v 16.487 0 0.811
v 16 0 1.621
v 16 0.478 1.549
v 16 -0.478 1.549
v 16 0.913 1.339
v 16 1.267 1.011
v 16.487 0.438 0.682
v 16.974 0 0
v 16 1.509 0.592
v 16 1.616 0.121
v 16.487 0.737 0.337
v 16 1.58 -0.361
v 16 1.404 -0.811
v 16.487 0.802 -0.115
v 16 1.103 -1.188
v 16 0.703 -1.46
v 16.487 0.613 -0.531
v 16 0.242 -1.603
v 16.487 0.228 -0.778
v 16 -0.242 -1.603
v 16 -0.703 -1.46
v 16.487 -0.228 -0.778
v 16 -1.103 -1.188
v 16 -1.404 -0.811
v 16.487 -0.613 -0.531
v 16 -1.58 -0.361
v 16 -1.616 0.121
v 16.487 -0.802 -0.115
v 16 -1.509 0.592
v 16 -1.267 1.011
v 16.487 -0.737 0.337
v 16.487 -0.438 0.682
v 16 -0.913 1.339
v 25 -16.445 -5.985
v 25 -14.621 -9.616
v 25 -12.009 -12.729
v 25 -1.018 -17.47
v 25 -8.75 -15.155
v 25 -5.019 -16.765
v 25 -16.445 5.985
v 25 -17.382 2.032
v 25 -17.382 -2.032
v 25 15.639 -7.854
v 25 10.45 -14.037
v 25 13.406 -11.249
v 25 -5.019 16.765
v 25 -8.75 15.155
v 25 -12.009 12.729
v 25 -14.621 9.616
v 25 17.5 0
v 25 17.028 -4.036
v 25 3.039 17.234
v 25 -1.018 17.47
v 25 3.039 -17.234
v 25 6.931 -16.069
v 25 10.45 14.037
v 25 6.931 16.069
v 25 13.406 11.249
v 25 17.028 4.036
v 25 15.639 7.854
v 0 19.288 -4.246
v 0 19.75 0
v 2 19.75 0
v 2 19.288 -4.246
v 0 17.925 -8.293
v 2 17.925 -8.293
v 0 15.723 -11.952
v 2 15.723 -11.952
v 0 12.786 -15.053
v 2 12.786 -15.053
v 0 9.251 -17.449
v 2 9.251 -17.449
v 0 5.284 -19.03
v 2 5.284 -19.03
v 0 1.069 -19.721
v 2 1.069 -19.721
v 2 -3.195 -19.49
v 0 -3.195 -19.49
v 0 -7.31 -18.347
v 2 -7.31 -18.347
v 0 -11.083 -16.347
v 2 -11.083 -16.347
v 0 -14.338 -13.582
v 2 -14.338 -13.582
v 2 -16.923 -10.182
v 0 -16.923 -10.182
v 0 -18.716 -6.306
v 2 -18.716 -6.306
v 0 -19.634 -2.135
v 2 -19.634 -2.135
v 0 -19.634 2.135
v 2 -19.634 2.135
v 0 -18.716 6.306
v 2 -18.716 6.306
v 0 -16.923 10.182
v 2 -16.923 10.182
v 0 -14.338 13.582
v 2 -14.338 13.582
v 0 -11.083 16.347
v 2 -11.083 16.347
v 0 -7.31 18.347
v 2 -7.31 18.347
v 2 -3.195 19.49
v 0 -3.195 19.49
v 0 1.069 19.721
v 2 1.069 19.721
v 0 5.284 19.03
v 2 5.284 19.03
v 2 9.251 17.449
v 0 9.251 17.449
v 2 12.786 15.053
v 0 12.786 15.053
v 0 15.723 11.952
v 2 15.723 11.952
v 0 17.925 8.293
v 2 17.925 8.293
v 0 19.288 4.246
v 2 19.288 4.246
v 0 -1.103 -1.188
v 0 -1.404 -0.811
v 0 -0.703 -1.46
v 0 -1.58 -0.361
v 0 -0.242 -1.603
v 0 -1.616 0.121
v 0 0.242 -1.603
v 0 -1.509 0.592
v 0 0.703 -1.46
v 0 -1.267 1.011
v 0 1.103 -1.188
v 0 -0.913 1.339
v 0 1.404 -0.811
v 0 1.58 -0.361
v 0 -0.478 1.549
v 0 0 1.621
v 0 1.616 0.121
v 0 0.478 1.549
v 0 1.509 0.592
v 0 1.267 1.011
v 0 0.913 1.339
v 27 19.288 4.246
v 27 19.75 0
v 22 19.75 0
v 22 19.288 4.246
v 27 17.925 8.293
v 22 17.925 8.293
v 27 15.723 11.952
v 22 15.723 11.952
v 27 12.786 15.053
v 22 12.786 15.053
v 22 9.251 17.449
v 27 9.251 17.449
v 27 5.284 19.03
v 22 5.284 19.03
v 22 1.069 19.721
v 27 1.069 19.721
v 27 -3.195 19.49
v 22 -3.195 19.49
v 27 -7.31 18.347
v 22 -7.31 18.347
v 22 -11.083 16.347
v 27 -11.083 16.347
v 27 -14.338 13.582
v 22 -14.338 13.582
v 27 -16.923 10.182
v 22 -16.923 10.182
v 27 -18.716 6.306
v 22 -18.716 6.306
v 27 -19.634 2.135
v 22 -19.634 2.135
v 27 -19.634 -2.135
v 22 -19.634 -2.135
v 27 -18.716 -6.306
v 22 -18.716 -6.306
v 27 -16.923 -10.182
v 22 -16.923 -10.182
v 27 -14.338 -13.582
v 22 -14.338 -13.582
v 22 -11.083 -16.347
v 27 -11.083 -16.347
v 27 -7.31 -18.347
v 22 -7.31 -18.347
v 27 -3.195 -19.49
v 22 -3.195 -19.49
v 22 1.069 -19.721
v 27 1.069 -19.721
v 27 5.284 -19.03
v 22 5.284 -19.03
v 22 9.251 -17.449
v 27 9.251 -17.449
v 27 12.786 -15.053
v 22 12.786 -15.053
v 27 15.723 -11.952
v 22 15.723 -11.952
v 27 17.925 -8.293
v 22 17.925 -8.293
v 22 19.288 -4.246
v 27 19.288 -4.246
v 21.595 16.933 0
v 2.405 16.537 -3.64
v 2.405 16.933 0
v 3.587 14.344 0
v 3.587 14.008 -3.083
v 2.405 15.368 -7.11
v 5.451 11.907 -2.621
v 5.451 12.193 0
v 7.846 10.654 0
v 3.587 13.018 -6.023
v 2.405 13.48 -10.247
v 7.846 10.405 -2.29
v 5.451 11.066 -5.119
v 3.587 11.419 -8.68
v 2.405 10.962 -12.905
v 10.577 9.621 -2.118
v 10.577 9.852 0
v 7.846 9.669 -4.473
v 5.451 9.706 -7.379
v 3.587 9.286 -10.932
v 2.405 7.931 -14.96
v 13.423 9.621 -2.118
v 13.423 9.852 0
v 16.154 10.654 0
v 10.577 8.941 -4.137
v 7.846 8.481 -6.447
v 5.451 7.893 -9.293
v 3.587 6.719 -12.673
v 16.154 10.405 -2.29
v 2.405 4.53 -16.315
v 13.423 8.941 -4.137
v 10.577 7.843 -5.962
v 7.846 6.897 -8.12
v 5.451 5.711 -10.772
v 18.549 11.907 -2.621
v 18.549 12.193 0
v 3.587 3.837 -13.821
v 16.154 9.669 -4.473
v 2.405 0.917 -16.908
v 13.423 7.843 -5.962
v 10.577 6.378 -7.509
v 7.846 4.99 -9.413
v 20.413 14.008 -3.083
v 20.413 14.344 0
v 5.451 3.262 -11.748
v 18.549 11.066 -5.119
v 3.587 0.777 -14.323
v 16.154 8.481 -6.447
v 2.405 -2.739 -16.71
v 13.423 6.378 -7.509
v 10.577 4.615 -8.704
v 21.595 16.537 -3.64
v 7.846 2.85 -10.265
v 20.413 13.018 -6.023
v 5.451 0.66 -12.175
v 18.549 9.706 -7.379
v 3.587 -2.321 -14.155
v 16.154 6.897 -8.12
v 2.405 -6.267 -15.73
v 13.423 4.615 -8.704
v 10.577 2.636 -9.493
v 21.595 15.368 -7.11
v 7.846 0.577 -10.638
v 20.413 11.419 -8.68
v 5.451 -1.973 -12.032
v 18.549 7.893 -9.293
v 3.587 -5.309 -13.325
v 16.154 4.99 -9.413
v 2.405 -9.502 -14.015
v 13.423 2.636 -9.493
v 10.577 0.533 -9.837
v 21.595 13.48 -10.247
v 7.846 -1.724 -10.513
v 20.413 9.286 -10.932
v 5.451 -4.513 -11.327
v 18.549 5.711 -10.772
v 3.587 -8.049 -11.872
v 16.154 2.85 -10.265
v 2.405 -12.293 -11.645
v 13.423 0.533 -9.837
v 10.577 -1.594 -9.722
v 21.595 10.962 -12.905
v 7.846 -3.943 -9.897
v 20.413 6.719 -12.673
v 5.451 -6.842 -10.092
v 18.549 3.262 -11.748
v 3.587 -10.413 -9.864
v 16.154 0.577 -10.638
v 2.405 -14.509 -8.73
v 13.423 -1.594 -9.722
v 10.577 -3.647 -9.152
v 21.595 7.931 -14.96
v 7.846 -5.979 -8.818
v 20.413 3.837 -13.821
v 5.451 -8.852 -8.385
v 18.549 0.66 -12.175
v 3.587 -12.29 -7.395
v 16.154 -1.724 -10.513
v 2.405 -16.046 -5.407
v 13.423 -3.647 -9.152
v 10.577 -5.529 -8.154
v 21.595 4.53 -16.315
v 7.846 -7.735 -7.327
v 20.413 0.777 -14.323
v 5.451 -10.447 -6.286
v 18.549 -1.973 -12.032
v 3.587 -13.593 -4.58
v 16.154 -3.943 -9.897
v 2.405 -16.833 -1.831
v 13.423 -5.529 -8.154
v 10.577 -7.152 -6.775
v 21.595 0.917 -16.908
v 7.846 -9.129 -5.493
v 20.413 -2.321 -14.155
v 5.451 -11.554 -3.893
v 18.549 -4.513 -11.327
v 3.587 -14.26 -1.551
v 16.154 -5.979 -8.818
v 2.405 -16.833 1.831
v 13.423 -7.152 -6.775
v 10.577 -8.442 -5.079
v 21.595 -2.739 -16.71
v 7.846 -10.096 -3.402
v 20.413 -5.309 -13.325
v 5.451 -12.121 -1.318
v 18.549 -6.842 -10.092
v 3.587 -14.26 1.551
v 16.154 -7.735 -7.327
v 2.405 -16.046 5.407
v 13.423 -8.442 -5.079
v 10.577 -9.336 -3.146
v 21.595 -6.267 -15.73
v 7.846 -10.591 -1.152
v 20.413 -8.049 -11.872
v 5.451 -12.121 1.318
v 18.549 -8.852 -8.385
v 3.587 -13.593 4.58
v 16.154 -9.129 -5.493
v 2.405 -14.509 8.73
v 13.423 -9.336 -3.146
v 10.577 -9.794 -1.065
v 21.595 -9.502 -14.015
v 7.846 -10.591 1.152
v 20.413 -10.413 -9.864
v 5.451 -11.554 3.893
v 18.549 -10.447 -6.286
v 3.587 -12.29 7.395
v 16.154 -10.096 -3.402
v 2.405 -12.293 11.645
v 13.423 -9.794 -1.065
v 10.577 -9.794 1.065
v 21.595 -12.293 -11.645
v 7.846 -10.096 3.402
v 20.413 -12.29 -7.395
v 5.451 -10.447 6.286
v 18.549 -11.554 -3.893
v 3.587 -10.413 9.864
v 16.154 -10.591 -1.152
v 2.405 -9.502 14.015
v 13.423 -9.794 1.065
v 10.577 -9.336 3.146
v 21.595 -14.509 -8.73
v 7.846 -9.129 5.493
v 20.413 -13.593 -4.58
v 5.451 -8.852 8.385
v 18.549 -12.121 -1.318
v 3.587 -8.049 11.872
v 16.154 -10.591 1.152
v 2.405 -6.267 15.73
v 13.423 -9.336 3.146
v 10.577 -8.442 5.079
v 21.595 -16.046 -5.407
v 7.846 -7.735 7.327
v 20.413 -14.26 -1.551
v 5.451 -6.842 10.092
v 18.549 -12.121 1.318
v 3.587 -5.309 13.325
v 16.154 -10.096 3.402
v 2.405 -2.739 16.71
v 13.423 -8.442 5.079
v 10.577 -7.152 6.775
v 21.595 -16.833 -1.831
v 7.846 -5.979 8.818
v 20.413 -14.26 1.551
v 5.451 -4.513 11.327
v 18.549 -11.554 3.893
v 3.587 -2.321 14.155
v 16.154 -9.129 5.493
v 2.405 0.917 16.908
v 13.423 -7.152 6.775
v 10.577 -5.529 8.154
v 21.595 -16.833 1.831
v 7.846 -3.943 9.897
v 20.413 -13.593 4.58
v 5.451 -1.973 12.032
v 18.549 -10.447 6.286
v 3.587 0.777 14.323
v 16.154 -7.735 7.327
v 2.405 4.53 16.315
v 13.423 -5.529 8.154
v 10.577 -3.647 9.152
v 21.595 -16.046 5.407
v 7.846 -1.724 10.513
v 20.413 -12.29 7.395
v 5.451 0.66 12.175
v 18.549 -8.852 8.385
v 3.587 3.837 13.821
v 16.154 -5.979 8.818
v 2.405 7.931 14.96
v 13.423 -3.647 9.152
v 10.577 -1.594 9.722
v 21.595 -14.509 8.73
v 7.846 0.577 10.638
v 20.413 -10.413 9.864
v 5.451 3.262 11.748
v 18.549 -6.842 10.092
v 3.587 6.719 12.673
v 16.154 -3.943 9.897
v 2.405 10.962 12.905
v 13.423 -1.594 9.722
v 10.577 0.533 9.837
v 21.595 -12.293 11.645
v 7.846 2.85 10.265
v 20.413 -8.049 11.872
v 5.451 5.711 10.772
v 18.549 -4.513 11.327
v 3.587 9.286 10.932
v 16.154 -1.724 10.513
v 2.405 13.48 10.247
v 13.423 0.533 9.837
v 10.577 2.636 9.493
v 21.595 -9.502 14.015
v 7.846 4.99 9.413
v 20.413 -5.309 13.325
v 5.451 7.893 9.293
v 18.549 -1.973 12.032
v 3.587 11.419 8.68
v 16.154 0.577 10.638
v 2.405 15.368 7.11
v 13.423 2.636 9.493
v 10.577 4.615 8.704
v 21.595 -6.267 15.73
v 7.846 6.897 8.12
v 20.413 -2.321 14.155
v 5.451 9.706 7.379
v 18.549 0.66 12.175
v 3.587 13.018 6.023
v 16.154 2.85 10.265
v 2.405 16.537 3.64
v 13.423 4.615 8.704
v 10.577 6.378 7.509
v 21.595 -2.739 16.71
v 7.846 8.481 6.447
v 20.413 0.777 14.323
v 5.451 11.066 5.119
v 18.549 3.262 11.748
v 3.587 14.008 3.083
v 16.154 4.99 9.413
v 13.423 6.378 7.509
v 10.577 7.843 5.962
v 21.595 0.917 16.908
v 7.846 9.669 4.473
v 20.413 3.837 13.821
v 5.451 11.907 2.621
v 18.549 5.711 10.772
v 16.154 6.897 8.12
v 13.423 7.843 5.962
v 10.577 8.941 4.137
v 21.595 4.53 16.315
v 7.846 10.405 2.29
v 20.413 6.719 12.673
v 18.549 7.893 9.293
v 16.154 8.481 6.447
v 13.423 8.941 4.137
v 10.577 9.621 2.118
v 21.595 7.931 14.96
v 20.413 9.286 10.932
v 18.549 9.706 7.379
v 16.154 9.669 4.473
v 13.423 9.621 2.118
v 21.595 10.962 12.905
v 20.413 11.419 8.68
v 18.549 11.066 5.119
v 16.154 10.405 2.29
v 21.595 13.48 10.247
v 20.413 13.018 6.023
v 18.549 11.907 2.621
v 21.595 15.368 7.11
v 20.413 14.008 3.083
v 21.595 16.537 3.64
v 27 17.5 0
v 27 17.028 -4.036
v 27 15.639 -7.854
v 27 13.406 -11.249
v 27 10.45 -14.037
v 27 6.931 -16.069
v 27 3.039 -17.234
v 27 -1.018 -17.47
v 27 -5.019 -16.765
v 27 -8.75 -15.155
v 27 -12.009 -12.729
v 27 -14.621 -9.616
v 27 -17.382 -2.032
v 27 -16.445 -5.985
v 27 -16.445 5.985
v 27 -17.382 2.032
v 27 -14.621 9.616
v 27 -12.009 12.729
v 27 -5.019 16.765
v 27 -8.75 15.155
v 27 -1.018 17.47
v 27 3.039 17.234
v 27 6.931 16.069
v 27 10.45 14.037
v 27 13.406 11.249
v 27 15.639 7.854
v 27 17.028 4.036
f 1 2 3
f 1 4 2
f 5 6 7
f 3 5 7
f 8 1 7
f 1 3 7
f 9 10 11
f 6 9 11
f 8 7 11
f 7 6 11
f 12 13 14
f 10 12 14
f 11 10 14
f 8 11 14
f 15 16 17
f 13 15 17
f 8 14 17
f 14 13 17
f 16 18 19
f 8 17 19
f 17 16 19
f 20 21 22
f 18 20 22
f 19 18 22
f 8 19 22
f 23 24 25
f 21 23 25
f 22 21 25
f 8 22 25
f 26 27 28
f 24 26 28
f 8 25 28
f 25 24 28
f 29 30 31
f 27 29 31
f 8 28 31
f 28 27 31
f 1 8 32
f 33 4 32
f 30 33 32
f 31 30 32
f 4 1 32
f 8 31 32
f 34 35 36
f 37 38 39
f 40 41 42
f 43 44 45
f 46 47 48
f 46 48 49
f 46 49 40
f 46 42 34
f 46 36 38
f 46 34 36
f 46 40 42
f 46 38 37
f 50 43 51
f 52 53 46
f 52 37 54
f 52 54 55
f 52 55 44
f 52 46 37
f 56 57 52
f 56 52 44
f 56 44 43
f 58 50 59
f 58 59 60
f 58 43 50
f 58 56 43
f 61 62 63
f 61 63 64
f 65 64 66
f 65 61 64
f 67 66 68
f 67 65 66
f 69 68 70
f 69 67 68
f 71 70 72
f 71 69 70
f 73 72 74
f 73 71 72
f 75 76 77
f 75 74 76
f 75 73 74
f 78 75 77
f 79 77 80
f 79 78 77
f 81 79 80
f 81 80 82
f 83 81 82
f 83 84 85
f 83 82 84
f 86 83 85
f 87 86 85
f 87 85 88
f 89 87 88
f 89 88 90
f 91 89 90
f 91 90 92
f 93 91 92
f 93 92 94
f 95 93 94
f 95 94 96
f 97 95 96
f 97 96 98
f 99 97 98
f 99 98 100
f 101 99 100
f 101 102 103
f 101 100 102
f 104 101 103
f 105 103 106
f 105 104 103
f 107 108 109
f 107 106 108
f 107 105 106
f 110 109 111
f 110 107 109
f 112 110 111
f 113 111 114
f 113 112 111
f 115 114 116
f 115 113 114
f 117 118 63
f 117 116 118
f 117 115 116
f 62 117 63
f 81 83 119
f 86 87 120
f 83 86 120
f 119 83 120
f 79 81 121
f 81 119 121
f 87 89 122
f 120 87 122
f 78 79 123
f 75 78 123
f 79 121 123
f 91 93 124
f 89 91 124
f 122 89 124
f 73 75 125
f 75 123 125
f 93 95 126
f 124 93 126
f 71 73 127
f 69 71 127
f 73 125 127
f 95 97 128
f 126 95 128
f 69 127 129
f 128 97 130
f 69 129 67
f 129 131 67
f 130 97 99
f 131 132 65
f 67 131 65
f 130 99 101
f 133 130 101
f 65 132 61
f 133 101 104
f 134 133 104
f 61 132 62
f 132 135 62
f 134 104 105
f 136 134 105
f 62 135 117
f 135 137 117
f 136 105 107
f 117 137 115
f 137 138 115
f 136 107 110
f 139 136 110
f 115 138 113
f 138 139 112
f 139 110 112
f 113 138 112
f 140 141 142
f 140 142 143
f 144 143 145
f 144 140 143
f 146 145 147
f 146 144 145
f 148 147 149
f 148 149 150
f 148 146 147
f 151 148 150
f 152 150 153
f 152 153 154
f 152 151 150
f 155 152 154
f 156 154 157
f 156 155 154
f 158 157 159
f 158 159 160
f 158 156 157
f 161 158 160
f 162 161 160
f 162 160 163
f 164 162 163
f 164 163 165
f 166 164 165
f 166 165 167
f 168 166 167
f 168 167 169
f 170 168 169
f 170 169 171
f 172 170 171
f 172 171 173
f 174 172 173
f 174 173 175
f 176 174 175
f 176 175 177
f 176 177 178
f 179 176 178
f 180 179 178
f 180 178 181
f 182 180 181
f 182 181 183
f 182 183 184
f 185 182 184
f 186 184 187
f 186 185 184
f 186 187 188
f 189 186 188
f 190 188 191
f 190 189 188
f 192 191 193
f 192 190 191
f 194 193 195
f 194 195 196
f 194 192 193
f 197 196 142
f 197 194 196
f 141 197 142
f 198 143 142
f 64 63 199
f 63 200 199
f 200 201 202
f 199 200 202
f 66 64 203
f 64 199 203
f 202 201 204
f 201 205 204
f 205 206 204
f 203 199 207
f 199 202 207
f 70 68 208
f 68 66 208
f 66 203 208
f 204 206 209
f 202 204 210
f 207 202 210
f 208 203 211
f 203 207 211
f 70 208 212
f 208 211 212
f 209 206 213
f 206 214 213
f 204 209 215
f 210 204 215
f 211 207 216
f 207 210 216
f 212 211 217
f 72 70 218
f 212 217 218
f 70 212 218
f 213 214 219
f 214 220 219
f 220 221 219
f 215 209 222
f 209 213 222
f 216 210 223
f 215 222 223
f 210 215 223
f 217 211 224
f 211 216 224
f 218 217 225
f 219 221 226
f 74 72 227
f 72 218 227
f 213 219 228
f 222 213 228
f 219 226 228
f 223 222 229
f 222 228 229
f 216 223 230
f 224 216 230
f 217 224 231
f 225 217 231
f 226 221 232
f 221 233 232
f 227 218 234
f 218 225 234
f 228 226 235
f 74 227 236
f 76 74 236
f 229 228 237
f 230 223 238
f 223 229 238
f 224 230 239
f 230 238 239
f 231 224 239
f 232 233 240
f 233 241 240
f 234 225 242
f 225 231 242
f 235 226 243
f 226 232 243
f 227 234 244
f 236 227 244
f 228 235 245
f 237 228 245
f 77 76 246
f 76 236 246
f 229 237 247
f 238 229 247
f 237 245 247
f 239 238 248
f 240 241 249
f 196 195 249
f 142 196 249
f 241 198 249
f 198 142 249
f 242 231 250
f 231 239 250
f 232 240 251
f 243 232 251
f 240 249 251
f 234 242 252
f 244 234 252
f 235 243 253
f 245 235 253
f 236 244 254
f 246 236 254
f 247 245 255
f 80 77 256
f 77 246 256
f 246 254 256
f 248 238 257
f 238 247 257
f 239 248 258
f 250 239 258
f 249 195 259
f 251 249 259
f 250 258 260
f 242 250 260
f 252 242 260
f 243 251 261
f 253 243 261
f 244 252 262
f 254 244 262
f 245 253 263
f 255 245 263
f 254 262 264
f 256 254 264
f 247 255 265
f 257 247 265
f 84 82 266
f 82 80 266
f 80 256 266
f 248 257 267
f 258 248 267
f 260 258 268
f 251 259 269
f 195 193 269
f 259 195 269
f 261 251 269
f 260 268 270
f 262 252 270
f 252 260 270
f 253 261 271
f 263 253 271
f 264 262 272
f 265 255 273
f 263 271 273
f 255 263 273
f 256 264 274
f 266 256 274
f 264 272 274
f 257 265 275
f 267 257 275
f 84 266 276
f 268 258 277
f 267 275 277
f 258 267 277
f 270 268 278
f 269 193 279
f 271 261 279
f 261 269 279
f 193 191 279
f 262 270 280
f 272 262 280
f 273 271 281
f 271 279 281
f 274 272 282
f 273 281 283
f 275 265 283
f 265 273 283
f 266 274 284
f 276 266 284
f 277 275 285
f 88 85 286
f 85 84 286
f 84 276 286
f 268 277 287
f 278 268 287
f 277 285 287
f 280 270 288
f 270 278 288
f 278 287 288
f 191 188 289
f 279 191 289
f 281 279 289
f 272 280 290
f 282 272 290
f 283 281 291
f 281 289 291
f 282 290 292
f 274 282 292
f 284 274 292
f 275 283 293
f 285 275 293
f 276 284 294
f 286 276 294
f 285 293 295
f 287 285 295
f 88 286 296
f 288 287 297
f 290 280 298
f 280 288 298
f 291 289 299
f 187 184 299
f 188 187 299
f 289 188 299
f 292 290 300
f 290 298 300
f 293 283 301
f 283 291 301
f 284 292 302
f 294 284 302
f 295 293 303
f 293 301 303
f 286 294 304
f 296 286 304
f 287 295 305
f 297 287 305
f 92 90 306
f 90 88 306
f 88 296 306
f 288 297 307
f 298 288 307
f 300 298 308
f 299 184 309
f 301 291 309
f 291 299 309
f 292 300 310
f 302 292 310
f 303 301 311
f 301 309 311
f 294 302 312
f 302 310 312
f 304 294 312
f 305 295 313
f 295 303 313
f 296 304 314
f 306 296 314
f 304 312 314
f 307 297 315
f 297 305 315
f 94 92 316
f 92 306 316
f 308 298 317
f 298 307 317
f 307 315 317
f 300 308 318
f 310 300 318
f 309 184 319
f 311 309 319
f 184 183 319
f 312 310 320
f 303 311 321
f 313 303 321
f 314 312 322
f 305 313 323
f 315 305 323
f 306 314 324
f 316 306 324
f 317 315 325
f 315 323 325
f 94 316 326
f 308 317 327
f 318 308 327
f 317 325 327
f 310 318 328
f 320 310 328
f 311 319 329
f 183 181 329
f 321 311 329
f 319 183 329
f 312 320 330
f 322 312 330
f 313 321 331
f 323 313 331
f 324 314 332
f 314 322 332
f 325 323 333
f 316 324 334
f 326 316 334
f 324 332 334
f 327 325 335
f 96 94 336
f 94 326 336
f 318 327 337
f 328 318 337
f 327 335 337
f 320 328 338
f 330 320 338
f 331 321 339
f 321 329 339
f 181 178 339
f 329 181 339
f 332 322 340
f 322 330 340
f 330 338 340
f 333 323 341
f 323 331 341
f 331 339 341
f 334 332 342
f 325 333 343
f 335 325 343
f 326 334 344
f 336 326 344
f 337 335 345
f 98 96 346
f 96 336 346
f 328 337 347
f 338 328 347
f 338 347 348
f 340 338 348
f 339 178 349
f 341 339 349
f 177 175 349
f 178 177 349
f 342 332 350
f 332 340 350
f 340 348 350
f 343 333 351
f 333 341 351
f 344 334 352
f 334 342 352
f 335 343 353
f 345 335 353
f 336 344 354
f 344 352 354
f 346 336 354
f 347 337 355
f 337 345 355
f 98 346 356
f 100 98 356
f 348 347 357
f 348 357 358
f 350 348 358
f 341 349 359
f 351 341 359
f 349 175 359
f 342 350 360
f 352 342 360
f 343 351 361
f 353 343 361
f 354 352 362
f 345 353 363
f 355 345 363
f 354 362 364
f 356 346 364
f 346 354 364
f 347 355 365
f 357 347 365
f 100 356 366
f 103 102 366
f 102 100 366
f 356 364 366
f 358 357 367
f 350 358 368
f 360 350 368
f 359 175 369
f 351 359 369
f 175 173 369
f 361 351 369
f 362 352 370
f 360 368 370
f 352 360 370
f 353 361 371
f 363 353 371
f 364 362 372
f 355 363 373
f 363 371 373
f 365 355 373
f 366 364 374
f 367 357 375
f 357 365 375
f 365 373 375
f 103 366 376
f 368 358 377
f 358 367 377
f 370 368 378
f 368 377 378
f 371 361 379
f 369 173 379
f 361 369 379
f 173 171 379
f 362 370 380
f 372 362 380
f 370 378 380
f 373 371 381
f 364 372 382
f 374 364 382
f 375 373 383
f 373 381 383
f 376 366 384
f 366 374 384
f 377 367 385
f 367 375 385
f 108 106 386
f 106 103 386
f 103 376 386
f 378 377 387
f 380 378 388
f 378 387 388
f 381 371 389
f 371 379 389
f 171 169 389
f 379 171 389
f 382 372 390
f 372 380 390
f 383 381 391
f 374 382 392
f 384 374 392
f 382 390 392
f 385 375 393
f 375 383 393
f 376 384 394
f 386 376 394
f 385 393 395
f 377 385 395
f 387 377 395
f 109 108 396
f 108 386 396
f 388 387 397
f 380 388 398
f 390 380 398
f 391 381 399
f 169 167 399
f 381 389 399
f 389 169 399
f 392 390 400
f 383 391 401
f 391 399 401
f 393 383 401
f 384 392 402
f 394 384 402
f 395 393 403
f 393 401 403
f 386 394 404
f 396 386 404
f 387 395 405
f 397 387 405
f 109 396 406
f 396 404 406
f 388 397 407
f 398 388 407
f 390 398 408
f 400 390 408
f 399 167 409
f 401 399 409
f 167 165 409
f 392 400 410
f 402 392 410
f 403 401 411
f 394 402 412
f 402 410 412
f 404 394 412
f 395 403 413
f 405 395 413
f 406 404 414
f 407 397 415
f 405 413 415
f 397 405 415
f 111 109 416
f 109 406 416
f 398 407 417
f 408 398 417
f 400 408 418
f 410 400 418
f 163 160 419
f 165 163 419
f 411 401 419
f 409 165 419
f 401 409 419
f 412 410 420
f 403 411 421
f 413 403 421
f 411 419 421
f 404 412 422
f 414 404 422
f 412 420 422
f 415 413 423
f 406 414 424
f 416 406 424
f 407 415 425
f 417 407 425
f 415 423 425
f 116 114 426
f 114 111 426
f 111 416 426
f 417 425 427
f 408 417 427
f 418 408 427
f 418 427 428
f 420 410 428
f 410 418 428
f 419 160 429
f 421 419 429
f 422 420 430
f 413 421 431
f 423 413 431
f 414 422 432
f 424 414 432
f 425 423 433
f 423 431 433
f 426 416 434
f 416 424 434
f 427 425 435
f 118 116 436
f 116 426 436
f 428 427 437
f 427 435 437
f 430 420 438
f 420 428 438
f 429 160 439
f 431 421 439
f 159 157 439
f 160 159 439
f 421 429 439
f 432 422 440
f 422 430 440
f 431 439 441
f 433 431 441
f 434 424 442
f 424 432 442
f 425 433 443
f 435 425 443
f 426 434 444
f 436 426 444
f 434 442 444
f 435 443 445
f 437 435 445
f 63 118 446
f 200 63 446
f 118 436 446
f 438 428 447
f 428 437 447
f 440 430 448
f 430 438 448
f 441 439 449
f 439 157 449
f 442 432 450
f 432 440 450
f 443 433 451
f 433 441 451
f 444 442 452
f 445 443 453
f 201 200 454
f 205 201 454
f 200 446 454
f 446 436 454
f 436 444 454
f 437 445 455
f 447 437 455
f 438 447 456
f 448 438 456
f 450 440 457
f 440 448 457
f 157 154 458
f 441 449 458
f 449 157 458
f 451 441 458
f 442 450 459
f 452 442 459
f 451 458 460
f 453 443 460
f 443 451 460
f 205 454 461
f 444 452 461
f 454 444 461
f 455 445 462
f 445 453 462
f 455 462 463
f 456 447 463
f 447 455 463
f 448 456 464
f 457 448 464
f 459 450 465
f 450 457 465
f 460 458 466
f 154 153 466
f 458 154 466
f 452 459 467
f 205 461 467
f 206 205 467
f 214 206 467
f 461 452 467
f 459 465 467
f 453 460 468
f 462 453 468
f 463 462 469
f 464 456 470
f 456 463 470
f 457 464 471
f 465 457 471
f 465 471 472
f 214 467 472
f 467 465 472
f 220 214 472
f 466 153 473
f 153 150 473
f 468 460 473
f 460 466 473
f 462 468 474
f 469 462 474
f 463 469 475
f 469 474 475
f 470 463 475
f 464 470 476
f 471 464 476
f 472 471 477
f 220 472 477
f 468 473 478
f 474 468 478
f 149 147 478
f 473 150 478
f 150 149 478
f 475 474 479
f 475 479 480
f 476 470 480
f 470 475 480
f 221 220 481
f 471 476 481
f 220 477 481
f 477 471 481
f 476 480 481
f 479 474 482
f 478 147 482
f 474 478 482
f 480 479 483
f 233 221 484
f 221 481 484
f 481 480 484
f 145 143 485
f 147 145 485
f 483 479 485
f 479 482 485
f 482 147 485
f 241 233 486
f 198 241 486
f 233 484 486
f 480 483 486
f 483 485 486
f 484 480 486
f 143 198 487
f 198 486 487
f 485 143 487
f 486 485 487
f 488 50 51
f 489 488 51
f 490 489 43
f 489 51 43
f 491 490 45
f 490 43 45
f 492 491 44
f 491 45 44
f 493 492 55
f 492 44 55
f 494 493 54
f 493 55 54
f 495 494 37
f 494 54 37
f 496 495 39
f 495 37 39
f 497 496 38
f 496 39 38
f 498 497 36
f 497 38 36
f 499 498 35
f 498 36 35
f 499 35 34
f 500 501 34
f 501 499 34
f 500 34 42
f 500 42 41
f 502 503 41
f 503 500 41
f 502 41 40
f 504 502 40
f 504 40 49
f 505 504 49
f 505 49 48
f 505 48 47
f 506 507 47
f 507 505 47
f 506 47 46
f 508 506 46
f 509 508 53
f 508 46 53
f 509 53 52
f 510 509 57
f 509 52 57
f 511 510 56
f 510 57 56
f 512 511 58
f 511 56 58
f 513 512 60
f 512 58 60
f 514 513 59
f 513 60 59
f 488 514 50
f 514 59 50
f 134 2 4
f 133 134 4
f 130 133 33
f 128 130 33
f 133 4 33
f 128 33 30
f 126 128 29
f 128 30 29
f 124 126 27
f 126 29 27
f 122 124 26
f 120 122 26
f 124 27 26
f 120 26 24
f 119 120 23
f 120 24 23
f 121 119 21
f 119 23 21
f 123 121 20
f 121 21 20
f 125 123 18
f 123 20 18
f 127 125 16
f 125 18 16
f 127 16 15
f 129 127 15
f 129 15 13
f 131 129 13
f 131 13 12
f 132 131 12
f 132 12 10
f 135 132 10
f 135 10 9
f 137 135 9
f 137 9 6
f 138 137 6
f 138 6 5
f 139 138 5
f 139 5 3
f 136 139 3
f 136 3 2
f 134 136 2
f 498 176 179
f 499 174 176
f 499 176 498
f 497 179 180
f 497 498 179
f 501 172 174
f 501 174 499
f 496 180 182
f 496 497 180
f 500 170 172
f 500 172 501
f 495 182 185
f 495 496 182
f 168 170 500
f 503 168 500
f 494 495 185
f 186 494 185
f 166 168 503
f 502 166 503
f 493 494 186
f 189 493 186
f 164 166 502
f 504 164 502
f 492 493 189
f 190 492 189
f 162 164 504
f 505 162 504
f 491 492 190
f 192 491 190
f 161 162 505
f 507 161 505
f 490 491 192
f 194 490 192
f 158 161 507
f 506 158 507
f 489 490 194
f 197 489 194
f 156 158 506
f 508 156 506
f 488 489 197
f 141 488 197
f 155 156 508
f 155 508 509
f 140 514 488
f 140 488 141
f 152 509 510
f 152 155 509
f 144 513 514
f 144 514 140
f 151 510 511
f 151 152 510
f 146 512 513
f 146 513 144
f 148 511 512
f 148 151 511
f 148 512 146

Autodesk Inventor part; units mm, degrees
ref_plane "YZ Plane" through (0, 0, 0) normal (1, 0, 0) x (0, 1, 0)
ref_plane "XZ Plane" through (0, 0, 0) normal (0, 1, 0) x (-1, 0, 0)
ref_plane "XY Plane" through (0, 0, 0) normal (0, 0, 1) x (1, 0, 0)
sketch "Skizze1" plane through (0, 0, 0) normal (0, 0, 1) x (1, 0, 0)
  line L0 (-5.4, 0) -> (32.4, 0) projected
  line L1 (0, -3.95) -> (0, 23.7) projected
  line L2 (0, 0) -> (0, 19.75)
  line L3 (2, 19.75) -> (0, 19.75)
  arc A0 (2, 19.75) -> (22, 19.75) centre (12, 19.75) ccw
  line L4 (22, 19.75) -> (27, 19.75)
  line L5 (27, 19.75) -> (27, 17.5)
  line L6 (27, 17.5) -> (25, 17.5)
  line L7 (25, 17.5) -> (25, 0)
  line L8 (0, 0) -> (25, 0)
  dimension "d0" = 27
  dimension "d1" = 2
  dimension "d2" = 39.5
  dimension "d3" = 10
  dimension "d4" = 12
  dimension "d5" = 5
  dimension "d6" = 35
revolve "Umdrehung1" add sketch "Skizze1" angle 360 about axis through (-10, 0, 0) along (1, 0, 0)
sketch "Skizze2" plane through (0, 0, 0) normal (-1, 0, 0) x (0, 0, 1)
  point P0 (0, 0)
  point P1 (0, 0)
hole "Bohrung1" at (0, 0, 0) direction (1, 0, 0) diameter 3.242 depth 16 tip angle 118 thread size "M4x0.7" class "6H" standard "ISO Metric profile"
properties part number "Brennersockel"
